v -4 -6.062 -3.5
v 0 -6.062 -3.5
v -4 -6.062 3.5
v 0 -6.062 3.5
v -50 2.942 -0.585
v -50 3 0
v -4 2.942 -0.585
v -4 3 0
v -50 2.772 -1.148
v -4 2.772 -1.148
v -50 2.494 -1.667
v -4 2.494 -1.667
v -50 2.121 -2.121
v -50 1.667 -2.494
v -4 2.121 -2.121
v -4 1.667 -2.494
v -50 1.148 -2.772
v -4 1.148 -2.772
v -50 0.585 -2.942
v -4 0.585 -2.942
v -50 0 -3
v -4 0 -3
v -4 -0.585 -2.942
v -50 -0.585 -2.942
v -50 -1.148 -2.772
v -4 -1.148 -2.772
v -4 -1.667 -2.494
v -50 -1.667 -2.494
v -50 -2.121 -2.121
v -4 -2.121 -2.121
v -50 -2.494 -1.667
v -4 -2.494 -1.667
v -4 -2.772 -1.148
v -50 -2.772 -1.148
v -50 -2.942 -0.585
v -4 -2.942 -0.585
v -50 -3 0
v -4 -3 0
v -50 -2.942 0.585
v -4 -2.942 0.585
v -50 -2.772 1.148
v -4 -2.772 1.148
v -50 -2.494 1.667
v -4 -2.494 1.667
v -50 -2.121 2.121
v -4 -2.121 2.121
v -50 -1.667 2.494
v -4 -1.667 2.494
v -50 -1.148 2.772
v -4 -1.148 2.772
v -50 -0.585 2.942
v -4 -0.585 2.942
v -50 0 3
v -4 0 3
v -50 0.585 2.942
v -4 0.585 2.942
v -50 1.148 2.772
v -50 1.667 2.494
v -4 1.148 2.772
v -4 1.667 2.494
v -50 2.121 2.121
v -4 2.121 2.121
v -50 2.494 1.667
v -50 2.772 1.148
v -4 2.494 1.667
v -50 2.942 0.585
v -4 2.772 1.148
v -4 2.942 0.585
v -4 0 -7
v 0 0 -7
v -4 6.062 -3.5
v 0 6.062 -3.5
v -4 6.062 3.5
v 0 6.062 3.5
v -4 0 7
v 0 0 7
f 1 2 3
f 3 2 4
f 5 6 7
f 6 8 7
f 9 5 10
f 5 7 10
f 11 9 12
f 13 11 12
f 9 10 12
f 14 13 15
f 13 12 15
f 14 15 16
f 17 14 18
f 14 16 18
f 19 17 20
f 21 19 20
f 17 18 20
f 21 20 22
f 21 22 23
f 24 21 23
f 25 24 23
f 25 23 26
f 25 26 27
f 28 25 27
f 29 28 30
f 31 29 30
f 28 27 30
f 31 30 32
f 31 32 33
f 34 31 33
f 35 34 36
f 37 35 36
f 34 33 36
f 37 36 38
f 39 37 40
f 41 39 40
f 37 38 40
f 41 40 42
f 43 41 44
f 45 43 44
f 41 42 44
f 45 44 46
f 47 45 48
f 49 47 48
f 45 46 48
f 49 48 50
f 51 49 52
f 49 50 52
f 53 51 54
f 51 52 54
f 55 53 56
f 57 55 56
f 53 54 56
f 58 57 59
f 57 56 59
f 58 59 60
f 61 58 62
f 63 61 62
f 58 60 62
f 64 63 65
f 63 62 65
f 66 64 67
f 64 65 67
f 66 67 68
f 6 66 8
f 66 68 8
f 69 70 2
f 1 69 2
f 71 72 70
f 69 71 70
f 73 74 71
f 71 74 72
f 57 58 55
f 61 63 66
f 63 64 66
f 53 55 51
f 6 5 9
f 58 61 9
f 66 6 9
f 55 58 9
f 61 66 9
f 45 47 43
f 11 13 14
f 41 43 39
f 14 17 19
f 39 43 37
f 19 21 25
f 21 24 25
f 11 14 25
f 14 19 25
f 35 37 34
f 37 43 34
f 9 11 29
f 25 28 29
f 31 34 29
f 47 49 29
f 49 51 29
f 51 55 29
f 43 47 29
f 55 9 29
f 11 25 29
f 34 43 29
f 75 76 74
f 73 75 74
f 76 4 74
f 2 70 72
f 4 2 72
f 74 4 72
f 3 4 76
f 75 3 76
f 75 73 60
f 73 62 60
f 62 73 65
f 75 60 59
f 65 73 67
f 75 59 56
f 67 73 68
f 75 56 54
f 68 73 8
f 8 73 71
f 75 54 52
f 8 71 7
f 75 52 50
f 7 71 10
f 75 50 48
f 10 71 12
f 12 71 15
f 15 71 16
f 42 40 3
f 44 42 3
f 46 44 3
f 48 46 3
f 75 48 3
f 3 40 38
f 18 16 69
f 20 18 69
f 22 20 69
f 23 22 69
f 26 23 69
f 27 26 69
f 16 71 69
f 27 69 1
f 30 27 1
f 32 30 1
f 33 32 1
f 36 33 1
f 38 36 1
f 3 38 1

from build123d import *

# Parameters (mm, degrees)
WYTNIJ_WYCI_GNI_CIE2_DEPTH = 4


with BuildPart() as part:
    # Szkic1 → Obrót1 (revolve)
    with BuildSketch(Plane.XY):
        Polygon((0, 0), (-50, 0), (-50, 3), (-4, 3), (-4, 7), (0, 7), align=None)
    revolve(axis=Axis((0, 0, 0), (-1, 0, 0)))

    # Szkic3 → Wytnij-wyciągnięcie2 (cut)
    with BuildSketch(Plane(origin=(0, 0, 0), x_dir=(0, 0, -1), z_dir=(1, 0, 0))):
        with BuildLine():
            Line((-7, 0), (-3.5, 6.062177826))
            ThreePointArc((-3.5, 6.062177826), (-6.062177826, 3.5), (-7, 0))
        make_face()
        with BuildLine():
            Line((-3.5, 6.062177826), (3.5, 6.062177826))
            ThreePointArc((3.5, 6.062177826), (0, 7), (-3.5, 6.062177826))
        make_face()
        with BuildLine():
            Line((3.5, 6.062177826), (7, 0))
            ThreePointArc((7, 0), (6.062177826, 3.5), (3.5, 6.062177826))
        make_face()
        with BuildLine():
            ThreePointArc((3.5, -6.062177826), (6.062177826, -3.5), (7, 0))
            Line((7, 0), (3.5, -6.062177826))
        make_face()
        with BuildLine():
            ThreePointArc((-3.5, -6.062177826), (0, -7), (3.5, -6.062177826))
            Line((3.5, -6.062177826), (-3.5, -6.062177826))
        make_face()
        with BuildLine():
            ThreePointArc((-7, 0), (-6.062177826, -3.5), (-3.5, -6.062177826))
            Line((-3.5, -6.062177826), (-7, 0))
        make_face()
    extrude(amount=-WYTNIJ_WYCI_GNI_CIE2_DEPTH, mode=Mode.SUBTRACT)


solid = part.part
